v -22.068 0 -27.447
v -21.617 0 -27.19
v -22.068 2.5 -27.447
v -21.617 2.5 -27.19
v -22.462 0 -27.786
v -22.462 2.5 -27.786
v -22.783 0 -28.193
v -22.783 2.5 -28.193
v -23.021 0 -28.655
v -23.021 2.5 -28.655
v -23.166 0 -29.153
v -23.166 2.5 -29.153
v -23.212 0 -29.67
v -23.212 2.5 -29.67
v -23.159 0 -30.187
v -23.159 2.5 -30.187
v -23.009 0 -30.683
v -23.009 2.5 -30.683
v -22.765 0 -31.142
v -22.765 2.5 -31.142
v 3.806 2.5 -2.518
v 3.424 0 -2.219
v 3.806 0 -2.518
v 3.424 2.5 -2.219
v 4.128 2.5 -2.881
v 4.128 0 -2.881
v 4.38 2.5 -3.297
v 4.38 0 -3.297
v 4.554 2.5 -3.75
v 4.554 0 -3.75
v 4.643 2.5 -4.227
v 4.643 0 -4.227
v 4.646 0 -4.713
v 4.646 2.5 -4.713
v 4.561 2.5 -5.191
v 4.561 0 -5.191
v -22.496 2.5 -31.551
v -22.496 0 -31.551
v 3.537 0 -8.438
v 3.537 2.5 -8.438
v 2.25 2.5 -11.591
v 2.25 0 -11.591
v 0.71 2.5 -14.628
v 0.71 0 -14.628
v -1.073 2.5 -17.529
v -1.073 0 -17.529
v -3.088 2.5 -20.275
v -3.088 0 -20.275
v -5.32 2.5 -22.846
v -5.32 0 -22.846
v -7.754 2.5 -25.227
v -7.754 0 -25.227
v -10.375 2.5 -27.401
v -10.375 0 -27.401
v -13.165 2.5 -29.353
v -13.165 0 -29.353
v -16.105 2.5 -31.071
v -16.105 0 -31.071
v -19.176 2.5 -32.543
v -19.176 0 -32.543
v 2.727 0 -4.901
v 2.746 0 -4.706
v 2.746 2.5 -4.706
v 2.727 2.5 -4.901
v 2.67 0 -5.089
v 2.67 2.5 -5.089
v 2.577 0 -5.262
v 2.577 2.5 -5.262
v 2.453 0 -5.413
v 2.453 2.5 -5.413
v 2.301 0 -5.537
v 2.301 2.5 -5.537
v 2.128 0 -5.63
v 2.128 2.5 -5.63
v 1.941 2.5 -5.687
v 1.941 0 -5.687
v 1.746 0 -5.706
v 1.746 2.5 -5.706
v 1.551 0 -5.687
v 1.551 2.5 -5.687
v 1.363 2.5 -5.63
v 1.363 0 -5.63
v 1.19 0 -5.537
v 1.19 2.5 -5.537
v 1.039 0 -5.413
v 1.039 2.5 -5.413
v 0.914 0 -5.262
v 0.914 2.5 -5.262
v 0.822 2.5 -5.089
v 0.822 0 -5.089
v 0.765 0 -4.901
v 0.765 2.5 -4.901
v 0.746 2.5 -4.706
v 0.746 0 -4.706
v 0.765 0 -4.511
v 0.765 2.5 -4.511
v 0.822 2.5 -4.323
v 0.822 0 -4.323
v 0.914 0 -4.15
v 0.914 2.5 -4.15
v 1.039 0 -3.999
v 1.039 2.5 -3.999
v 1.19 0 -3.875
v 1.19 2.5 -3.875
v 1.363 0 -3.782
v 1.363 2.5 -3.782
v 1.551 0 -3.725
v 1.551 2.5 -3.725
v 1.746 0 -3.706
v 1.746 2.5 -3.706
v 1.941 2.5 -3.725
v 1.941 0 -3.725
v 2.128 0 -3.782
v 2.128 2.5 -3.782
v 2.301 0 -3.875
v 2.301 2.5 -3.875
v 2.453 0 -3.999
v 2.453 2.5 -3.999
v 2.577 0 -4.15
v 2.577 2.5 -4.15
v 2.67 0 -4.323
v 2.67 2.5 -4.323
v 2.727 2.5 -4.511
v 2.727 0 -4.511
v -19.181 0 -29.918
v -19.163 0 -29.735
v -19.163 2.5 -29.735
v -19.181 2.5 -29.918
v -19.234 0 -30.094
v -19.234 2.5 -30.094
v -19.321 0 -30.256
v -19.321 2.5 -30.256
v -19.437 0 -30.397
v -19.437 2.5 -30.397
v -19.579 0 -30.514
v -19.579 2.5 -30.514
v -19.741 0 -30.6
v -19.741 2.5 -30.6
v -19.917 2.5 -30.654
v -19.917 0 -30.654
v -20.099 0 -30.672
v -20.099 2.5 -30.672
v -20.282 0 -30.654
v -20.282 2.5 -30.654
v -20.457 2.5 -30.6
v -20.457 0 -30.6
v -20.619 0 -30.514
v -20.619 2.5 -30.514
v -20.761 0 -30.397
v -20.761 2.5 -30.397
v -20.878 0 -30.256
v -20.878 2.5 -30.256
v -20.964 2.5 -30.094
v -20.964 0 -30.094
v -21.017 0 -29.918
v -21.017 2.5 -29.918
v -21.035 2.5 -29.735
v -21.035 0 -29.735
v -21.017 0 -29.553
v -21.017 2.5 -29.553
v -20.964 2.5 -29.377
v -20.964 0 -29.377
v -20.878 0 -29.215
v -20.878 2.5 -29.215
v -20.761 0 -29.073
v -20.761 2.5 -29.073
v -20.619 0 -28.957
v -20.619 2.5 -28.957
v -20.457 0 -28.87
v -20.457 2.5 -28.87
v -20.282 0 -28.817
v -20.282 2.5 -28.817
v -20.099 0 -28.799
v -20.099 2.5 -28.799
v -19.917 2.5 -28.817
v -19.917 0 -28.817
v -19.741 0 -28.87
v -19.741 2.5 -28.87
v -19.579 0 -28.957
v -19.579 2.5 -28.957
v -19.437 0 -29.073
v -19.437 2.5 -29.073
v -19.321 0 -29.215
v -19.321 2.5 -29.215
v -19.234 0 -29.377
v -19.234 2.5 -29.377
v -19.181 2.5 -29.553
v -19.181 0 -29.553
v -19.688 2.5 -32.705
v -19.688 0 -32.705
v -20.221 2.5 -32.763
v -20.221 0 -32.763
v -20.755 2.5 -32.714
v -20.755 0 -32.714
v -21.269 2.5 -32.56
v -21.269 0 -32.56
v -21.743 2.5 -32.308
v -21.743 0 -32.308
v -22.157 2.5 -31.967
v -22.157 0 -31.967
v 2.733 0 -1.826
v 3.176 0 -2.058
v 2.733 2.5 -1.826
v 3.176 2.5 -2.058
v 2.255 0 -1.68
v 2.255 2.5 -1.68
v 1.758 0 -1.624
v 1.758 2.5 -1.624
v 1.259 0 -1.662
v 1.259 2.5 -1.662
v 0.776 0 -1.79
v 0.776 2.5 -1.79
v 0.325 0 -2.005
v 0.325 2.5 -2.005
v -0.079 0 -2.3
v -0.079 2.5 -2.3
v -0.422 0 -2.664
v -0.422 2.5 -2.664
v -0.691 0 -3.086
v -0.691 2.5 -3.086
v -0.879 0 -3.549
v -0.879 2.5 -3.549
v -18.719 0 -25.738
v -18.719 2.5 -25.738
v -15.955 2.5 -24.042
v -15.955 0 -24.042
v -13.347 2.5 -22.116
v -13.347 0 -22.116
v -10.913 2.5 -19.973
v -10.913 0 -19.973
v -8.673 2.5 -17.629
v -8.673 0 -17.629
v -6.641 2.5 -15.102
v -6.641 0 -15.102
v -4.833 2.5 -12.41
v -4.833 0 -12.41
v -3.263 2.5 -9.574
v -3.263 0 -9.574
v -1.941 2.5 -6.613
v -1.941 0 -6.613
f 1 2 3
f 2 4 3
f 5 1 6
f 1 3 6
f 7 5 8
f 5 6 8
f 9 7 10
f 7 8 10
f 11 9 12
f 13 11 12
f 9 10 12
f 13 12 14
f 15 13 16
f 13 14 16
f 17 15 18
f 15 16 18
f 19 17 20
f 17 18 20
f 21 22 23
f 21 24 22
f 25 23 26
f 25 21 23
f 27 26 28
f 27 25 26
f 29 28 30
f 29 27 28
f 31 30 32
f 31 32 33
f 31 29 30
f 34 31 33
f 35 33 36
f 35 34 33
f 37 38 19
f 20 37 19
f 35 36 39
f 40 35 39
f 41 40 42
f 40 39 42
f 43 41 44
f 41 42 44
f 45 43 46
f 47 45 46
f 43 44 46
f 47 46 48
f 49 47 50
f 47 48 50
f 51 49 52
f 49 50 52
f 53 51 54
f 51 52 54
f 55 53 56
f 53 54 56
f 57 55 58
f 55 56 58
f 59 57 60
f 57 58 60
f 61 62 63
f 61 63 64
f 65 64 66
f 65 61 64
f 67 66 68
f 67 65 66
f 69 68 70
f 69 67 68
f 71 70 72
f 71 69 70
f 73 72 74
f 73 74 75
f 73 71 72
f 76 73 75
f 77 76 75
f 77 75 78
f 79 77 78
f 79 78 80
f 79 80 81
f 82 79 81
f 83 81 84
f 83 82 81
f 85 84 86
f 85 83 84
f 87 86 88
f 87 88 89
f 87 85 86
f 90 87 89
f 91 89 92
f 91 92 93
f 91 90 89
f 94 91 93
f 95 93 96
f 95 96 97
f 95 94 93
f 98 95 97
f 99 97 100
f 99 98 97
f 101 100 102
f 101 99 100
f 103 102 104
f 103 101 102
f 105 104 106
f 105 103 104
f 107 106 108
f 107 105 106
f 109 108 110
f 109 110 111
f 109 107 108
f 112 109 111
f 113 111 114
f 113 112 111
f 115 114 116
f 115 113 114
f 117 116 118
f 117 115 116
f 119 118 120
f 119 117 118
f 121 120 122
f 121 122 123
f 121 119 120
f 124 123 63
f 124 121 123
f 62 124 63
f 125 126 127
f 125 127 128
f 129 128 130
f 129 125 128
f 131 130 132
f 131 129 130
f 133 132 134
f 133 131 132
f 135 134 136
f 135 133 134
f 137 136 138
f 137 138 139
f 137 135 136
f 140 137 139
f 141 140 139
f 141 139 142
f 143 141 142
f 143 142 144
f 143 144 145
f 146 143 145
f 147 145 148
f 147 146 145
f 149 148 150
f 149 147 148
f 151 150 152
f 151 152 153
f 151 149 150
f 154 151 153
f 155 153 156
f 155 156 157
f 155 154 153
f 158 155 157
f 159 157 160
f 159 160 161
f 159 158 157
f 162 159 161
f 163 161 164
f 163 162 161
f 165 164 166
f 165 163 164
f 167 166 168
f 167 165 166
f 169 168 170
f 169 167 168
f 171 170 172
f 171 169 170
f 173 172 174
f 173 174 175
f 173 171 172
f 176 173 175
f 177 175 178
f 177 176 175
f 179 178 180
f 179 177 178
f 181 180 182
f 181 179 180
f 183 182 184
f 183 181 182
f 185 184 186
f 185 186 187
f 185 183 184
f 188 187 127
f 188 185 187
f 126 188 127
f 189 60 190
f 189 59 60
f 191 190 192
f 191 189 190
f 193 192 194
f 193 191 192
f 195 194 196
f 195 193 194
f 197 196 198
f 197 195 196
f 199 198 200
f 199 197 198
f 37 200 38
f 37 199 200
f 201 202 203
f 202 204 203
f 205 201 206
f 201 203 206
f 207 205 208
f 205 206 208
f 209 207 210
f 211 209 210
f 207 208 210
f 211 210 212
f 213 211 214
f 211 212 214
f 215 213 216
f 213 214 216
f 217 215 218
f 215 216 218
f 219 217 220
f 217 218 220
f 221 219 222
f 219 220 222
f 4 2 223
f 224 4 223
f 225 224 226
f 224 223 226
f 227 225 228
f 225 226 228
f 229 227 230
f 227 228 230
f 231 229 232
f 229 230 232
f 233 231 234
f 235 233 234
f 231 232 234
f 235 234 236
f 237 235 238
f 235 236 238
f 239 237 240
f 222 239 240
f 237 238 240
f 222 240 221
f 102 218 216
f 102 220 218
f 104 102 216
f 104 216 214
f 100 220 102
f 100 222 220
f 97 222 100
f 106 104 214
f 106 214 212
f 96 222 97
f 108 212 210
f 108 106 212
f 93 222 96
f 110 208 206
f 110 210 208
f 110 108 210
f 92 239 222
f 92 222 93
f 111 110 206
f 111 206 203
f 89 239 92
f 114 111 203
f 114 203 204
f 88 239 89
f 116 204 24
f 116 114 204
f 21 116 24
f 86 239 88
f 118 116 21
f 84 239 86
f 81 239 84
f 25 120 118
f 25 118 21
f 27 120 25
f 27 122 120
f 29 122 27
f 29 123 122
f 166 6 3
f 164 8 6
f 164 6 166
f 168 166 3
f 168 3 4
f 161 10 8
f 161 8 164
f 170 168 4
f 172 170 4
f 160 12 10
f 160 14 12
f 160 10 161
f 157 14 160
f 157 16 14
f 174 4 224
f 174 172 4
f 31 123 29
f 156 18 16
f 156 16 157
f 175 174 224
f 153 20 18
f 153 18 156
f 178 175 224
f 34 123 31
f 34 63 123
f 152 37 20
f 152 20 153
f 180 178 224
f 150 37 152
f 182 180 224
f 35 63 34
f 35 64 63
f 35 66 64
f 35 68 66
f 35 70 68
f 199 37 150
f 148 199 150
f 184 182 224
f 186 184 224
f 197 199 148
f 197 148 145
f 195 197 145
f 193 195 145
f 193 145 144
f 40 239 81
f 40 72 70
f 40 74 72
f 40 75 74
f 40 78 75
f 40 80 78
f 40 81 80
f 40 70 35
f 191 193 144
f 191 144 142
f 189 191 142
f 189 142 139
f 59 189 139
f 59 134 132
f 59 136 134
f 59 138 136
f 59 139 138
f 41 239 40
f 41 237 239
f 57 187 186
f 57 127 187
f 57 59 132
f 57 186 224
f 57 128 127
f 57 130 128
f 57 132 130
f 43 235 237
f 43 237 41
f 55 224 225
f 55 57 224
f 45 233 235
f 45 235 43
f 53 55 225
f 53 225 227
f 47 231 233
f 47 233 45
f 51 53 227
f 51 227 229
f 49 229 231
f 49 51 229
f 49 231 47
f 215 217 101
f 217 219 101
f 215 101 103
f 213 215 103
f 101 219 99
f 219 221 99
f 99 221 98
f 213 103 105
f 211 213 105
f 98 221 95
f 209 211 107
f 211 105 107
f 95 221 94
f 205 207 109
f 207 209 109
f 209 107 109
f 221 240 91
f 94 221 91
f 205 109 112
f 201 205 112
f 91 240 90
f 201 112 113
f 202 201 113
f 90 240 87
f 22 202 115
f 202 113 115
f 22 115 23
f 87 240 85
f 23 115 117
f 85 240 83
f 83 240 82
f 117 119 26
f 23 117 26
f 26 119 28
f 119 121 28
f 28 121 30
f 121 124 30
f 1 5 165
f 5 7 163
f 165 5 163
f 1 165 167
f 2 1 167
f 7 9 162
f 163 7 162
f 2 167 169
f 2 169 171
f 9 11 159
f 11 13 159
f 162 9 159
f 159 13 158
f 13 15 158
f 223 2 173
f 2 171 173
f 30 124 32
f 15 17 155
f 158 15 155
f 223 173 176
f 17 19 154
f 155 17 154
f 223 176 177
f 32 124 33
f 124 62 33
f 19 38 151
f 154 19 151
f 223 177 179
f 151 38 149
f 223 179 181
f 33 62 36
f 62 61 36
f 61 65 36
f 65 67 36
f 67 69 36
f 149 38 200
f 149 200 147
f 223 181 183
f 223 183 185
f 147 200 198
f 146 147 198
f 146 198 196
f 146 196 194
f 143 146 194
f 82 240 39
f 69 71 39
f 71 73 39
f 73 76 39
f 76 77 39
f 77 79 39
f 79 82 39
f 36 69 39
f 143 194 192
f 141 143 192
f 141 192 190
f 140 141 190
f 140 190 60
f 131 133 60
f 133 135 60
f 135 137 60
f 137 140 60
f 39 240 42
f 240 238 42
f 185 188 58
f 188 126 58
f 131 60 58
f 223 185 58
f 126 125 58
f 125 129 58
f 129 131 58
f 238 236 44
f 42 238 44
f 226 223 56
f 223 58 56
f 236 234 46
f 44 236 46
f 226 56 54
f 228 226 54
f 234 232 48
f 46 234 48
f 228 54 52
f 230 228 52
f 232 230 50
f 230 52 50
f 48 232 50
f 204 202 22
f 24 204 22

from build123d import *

# Parameters (mm, degrees)
SCHIZZO1_R                   = 0.936245514
SCHIZZO1_R_2                 = 1
ESTRUSIONE_ESTRUSIONE1_DEPTH = 2.5
RACCORDO1_R                  = 2.7


with BuildPart() as part:
    # Schizzo1 → Estrusione-Estrusione1 (new body)
    with BuildSketch(Plane(origin=(0, 0, 0), x_dir=(1, 0, 0), z_dir=(0, 1, 0))):
        with BuildLine():
            Line((0, 0), (5.035291563, 3.262796174))
            ThreePointArc((5.035291563, 3.262796174), (-4.27091895, 21.690860387), (-21.285586763, 33.382745778))
            Line((-21.285586763, 33.382745778), (-24.592109016, 28.376059189))
            ThreePointArc((-24.592109016, 28.376059189), (-8.523142058, 17.457823812), (0, 0))
        make_face()
        with Locations((-20.099209332, 29.73535462)):
            Circle(SCHIZZO1_R, mode=Mode.SUBTRACT)
        with Locations((1.745777445, 4.706006726)):
            Circle(SCHIZZO1_R_2, mode=Mode.SUBTRACT)
    extrude(amount=ESTRUSIONE_ESTRUSIONE1_DEPTH)

    # Raccordo1
    raccordo1_edges = [part.edges().sort_by_distance(p)[0] for p in [
        (-24.592109016, 1.25, -28.376059189),
        (-21.285586763, 1.25, -33.382745778),
        (5.035291563, 1.25, -3.262796174),
        (0, 1.25, 0),
    ]]
    fillet(raccordo1_edges, radius=RACCORDO1_R)


solid = part.part
